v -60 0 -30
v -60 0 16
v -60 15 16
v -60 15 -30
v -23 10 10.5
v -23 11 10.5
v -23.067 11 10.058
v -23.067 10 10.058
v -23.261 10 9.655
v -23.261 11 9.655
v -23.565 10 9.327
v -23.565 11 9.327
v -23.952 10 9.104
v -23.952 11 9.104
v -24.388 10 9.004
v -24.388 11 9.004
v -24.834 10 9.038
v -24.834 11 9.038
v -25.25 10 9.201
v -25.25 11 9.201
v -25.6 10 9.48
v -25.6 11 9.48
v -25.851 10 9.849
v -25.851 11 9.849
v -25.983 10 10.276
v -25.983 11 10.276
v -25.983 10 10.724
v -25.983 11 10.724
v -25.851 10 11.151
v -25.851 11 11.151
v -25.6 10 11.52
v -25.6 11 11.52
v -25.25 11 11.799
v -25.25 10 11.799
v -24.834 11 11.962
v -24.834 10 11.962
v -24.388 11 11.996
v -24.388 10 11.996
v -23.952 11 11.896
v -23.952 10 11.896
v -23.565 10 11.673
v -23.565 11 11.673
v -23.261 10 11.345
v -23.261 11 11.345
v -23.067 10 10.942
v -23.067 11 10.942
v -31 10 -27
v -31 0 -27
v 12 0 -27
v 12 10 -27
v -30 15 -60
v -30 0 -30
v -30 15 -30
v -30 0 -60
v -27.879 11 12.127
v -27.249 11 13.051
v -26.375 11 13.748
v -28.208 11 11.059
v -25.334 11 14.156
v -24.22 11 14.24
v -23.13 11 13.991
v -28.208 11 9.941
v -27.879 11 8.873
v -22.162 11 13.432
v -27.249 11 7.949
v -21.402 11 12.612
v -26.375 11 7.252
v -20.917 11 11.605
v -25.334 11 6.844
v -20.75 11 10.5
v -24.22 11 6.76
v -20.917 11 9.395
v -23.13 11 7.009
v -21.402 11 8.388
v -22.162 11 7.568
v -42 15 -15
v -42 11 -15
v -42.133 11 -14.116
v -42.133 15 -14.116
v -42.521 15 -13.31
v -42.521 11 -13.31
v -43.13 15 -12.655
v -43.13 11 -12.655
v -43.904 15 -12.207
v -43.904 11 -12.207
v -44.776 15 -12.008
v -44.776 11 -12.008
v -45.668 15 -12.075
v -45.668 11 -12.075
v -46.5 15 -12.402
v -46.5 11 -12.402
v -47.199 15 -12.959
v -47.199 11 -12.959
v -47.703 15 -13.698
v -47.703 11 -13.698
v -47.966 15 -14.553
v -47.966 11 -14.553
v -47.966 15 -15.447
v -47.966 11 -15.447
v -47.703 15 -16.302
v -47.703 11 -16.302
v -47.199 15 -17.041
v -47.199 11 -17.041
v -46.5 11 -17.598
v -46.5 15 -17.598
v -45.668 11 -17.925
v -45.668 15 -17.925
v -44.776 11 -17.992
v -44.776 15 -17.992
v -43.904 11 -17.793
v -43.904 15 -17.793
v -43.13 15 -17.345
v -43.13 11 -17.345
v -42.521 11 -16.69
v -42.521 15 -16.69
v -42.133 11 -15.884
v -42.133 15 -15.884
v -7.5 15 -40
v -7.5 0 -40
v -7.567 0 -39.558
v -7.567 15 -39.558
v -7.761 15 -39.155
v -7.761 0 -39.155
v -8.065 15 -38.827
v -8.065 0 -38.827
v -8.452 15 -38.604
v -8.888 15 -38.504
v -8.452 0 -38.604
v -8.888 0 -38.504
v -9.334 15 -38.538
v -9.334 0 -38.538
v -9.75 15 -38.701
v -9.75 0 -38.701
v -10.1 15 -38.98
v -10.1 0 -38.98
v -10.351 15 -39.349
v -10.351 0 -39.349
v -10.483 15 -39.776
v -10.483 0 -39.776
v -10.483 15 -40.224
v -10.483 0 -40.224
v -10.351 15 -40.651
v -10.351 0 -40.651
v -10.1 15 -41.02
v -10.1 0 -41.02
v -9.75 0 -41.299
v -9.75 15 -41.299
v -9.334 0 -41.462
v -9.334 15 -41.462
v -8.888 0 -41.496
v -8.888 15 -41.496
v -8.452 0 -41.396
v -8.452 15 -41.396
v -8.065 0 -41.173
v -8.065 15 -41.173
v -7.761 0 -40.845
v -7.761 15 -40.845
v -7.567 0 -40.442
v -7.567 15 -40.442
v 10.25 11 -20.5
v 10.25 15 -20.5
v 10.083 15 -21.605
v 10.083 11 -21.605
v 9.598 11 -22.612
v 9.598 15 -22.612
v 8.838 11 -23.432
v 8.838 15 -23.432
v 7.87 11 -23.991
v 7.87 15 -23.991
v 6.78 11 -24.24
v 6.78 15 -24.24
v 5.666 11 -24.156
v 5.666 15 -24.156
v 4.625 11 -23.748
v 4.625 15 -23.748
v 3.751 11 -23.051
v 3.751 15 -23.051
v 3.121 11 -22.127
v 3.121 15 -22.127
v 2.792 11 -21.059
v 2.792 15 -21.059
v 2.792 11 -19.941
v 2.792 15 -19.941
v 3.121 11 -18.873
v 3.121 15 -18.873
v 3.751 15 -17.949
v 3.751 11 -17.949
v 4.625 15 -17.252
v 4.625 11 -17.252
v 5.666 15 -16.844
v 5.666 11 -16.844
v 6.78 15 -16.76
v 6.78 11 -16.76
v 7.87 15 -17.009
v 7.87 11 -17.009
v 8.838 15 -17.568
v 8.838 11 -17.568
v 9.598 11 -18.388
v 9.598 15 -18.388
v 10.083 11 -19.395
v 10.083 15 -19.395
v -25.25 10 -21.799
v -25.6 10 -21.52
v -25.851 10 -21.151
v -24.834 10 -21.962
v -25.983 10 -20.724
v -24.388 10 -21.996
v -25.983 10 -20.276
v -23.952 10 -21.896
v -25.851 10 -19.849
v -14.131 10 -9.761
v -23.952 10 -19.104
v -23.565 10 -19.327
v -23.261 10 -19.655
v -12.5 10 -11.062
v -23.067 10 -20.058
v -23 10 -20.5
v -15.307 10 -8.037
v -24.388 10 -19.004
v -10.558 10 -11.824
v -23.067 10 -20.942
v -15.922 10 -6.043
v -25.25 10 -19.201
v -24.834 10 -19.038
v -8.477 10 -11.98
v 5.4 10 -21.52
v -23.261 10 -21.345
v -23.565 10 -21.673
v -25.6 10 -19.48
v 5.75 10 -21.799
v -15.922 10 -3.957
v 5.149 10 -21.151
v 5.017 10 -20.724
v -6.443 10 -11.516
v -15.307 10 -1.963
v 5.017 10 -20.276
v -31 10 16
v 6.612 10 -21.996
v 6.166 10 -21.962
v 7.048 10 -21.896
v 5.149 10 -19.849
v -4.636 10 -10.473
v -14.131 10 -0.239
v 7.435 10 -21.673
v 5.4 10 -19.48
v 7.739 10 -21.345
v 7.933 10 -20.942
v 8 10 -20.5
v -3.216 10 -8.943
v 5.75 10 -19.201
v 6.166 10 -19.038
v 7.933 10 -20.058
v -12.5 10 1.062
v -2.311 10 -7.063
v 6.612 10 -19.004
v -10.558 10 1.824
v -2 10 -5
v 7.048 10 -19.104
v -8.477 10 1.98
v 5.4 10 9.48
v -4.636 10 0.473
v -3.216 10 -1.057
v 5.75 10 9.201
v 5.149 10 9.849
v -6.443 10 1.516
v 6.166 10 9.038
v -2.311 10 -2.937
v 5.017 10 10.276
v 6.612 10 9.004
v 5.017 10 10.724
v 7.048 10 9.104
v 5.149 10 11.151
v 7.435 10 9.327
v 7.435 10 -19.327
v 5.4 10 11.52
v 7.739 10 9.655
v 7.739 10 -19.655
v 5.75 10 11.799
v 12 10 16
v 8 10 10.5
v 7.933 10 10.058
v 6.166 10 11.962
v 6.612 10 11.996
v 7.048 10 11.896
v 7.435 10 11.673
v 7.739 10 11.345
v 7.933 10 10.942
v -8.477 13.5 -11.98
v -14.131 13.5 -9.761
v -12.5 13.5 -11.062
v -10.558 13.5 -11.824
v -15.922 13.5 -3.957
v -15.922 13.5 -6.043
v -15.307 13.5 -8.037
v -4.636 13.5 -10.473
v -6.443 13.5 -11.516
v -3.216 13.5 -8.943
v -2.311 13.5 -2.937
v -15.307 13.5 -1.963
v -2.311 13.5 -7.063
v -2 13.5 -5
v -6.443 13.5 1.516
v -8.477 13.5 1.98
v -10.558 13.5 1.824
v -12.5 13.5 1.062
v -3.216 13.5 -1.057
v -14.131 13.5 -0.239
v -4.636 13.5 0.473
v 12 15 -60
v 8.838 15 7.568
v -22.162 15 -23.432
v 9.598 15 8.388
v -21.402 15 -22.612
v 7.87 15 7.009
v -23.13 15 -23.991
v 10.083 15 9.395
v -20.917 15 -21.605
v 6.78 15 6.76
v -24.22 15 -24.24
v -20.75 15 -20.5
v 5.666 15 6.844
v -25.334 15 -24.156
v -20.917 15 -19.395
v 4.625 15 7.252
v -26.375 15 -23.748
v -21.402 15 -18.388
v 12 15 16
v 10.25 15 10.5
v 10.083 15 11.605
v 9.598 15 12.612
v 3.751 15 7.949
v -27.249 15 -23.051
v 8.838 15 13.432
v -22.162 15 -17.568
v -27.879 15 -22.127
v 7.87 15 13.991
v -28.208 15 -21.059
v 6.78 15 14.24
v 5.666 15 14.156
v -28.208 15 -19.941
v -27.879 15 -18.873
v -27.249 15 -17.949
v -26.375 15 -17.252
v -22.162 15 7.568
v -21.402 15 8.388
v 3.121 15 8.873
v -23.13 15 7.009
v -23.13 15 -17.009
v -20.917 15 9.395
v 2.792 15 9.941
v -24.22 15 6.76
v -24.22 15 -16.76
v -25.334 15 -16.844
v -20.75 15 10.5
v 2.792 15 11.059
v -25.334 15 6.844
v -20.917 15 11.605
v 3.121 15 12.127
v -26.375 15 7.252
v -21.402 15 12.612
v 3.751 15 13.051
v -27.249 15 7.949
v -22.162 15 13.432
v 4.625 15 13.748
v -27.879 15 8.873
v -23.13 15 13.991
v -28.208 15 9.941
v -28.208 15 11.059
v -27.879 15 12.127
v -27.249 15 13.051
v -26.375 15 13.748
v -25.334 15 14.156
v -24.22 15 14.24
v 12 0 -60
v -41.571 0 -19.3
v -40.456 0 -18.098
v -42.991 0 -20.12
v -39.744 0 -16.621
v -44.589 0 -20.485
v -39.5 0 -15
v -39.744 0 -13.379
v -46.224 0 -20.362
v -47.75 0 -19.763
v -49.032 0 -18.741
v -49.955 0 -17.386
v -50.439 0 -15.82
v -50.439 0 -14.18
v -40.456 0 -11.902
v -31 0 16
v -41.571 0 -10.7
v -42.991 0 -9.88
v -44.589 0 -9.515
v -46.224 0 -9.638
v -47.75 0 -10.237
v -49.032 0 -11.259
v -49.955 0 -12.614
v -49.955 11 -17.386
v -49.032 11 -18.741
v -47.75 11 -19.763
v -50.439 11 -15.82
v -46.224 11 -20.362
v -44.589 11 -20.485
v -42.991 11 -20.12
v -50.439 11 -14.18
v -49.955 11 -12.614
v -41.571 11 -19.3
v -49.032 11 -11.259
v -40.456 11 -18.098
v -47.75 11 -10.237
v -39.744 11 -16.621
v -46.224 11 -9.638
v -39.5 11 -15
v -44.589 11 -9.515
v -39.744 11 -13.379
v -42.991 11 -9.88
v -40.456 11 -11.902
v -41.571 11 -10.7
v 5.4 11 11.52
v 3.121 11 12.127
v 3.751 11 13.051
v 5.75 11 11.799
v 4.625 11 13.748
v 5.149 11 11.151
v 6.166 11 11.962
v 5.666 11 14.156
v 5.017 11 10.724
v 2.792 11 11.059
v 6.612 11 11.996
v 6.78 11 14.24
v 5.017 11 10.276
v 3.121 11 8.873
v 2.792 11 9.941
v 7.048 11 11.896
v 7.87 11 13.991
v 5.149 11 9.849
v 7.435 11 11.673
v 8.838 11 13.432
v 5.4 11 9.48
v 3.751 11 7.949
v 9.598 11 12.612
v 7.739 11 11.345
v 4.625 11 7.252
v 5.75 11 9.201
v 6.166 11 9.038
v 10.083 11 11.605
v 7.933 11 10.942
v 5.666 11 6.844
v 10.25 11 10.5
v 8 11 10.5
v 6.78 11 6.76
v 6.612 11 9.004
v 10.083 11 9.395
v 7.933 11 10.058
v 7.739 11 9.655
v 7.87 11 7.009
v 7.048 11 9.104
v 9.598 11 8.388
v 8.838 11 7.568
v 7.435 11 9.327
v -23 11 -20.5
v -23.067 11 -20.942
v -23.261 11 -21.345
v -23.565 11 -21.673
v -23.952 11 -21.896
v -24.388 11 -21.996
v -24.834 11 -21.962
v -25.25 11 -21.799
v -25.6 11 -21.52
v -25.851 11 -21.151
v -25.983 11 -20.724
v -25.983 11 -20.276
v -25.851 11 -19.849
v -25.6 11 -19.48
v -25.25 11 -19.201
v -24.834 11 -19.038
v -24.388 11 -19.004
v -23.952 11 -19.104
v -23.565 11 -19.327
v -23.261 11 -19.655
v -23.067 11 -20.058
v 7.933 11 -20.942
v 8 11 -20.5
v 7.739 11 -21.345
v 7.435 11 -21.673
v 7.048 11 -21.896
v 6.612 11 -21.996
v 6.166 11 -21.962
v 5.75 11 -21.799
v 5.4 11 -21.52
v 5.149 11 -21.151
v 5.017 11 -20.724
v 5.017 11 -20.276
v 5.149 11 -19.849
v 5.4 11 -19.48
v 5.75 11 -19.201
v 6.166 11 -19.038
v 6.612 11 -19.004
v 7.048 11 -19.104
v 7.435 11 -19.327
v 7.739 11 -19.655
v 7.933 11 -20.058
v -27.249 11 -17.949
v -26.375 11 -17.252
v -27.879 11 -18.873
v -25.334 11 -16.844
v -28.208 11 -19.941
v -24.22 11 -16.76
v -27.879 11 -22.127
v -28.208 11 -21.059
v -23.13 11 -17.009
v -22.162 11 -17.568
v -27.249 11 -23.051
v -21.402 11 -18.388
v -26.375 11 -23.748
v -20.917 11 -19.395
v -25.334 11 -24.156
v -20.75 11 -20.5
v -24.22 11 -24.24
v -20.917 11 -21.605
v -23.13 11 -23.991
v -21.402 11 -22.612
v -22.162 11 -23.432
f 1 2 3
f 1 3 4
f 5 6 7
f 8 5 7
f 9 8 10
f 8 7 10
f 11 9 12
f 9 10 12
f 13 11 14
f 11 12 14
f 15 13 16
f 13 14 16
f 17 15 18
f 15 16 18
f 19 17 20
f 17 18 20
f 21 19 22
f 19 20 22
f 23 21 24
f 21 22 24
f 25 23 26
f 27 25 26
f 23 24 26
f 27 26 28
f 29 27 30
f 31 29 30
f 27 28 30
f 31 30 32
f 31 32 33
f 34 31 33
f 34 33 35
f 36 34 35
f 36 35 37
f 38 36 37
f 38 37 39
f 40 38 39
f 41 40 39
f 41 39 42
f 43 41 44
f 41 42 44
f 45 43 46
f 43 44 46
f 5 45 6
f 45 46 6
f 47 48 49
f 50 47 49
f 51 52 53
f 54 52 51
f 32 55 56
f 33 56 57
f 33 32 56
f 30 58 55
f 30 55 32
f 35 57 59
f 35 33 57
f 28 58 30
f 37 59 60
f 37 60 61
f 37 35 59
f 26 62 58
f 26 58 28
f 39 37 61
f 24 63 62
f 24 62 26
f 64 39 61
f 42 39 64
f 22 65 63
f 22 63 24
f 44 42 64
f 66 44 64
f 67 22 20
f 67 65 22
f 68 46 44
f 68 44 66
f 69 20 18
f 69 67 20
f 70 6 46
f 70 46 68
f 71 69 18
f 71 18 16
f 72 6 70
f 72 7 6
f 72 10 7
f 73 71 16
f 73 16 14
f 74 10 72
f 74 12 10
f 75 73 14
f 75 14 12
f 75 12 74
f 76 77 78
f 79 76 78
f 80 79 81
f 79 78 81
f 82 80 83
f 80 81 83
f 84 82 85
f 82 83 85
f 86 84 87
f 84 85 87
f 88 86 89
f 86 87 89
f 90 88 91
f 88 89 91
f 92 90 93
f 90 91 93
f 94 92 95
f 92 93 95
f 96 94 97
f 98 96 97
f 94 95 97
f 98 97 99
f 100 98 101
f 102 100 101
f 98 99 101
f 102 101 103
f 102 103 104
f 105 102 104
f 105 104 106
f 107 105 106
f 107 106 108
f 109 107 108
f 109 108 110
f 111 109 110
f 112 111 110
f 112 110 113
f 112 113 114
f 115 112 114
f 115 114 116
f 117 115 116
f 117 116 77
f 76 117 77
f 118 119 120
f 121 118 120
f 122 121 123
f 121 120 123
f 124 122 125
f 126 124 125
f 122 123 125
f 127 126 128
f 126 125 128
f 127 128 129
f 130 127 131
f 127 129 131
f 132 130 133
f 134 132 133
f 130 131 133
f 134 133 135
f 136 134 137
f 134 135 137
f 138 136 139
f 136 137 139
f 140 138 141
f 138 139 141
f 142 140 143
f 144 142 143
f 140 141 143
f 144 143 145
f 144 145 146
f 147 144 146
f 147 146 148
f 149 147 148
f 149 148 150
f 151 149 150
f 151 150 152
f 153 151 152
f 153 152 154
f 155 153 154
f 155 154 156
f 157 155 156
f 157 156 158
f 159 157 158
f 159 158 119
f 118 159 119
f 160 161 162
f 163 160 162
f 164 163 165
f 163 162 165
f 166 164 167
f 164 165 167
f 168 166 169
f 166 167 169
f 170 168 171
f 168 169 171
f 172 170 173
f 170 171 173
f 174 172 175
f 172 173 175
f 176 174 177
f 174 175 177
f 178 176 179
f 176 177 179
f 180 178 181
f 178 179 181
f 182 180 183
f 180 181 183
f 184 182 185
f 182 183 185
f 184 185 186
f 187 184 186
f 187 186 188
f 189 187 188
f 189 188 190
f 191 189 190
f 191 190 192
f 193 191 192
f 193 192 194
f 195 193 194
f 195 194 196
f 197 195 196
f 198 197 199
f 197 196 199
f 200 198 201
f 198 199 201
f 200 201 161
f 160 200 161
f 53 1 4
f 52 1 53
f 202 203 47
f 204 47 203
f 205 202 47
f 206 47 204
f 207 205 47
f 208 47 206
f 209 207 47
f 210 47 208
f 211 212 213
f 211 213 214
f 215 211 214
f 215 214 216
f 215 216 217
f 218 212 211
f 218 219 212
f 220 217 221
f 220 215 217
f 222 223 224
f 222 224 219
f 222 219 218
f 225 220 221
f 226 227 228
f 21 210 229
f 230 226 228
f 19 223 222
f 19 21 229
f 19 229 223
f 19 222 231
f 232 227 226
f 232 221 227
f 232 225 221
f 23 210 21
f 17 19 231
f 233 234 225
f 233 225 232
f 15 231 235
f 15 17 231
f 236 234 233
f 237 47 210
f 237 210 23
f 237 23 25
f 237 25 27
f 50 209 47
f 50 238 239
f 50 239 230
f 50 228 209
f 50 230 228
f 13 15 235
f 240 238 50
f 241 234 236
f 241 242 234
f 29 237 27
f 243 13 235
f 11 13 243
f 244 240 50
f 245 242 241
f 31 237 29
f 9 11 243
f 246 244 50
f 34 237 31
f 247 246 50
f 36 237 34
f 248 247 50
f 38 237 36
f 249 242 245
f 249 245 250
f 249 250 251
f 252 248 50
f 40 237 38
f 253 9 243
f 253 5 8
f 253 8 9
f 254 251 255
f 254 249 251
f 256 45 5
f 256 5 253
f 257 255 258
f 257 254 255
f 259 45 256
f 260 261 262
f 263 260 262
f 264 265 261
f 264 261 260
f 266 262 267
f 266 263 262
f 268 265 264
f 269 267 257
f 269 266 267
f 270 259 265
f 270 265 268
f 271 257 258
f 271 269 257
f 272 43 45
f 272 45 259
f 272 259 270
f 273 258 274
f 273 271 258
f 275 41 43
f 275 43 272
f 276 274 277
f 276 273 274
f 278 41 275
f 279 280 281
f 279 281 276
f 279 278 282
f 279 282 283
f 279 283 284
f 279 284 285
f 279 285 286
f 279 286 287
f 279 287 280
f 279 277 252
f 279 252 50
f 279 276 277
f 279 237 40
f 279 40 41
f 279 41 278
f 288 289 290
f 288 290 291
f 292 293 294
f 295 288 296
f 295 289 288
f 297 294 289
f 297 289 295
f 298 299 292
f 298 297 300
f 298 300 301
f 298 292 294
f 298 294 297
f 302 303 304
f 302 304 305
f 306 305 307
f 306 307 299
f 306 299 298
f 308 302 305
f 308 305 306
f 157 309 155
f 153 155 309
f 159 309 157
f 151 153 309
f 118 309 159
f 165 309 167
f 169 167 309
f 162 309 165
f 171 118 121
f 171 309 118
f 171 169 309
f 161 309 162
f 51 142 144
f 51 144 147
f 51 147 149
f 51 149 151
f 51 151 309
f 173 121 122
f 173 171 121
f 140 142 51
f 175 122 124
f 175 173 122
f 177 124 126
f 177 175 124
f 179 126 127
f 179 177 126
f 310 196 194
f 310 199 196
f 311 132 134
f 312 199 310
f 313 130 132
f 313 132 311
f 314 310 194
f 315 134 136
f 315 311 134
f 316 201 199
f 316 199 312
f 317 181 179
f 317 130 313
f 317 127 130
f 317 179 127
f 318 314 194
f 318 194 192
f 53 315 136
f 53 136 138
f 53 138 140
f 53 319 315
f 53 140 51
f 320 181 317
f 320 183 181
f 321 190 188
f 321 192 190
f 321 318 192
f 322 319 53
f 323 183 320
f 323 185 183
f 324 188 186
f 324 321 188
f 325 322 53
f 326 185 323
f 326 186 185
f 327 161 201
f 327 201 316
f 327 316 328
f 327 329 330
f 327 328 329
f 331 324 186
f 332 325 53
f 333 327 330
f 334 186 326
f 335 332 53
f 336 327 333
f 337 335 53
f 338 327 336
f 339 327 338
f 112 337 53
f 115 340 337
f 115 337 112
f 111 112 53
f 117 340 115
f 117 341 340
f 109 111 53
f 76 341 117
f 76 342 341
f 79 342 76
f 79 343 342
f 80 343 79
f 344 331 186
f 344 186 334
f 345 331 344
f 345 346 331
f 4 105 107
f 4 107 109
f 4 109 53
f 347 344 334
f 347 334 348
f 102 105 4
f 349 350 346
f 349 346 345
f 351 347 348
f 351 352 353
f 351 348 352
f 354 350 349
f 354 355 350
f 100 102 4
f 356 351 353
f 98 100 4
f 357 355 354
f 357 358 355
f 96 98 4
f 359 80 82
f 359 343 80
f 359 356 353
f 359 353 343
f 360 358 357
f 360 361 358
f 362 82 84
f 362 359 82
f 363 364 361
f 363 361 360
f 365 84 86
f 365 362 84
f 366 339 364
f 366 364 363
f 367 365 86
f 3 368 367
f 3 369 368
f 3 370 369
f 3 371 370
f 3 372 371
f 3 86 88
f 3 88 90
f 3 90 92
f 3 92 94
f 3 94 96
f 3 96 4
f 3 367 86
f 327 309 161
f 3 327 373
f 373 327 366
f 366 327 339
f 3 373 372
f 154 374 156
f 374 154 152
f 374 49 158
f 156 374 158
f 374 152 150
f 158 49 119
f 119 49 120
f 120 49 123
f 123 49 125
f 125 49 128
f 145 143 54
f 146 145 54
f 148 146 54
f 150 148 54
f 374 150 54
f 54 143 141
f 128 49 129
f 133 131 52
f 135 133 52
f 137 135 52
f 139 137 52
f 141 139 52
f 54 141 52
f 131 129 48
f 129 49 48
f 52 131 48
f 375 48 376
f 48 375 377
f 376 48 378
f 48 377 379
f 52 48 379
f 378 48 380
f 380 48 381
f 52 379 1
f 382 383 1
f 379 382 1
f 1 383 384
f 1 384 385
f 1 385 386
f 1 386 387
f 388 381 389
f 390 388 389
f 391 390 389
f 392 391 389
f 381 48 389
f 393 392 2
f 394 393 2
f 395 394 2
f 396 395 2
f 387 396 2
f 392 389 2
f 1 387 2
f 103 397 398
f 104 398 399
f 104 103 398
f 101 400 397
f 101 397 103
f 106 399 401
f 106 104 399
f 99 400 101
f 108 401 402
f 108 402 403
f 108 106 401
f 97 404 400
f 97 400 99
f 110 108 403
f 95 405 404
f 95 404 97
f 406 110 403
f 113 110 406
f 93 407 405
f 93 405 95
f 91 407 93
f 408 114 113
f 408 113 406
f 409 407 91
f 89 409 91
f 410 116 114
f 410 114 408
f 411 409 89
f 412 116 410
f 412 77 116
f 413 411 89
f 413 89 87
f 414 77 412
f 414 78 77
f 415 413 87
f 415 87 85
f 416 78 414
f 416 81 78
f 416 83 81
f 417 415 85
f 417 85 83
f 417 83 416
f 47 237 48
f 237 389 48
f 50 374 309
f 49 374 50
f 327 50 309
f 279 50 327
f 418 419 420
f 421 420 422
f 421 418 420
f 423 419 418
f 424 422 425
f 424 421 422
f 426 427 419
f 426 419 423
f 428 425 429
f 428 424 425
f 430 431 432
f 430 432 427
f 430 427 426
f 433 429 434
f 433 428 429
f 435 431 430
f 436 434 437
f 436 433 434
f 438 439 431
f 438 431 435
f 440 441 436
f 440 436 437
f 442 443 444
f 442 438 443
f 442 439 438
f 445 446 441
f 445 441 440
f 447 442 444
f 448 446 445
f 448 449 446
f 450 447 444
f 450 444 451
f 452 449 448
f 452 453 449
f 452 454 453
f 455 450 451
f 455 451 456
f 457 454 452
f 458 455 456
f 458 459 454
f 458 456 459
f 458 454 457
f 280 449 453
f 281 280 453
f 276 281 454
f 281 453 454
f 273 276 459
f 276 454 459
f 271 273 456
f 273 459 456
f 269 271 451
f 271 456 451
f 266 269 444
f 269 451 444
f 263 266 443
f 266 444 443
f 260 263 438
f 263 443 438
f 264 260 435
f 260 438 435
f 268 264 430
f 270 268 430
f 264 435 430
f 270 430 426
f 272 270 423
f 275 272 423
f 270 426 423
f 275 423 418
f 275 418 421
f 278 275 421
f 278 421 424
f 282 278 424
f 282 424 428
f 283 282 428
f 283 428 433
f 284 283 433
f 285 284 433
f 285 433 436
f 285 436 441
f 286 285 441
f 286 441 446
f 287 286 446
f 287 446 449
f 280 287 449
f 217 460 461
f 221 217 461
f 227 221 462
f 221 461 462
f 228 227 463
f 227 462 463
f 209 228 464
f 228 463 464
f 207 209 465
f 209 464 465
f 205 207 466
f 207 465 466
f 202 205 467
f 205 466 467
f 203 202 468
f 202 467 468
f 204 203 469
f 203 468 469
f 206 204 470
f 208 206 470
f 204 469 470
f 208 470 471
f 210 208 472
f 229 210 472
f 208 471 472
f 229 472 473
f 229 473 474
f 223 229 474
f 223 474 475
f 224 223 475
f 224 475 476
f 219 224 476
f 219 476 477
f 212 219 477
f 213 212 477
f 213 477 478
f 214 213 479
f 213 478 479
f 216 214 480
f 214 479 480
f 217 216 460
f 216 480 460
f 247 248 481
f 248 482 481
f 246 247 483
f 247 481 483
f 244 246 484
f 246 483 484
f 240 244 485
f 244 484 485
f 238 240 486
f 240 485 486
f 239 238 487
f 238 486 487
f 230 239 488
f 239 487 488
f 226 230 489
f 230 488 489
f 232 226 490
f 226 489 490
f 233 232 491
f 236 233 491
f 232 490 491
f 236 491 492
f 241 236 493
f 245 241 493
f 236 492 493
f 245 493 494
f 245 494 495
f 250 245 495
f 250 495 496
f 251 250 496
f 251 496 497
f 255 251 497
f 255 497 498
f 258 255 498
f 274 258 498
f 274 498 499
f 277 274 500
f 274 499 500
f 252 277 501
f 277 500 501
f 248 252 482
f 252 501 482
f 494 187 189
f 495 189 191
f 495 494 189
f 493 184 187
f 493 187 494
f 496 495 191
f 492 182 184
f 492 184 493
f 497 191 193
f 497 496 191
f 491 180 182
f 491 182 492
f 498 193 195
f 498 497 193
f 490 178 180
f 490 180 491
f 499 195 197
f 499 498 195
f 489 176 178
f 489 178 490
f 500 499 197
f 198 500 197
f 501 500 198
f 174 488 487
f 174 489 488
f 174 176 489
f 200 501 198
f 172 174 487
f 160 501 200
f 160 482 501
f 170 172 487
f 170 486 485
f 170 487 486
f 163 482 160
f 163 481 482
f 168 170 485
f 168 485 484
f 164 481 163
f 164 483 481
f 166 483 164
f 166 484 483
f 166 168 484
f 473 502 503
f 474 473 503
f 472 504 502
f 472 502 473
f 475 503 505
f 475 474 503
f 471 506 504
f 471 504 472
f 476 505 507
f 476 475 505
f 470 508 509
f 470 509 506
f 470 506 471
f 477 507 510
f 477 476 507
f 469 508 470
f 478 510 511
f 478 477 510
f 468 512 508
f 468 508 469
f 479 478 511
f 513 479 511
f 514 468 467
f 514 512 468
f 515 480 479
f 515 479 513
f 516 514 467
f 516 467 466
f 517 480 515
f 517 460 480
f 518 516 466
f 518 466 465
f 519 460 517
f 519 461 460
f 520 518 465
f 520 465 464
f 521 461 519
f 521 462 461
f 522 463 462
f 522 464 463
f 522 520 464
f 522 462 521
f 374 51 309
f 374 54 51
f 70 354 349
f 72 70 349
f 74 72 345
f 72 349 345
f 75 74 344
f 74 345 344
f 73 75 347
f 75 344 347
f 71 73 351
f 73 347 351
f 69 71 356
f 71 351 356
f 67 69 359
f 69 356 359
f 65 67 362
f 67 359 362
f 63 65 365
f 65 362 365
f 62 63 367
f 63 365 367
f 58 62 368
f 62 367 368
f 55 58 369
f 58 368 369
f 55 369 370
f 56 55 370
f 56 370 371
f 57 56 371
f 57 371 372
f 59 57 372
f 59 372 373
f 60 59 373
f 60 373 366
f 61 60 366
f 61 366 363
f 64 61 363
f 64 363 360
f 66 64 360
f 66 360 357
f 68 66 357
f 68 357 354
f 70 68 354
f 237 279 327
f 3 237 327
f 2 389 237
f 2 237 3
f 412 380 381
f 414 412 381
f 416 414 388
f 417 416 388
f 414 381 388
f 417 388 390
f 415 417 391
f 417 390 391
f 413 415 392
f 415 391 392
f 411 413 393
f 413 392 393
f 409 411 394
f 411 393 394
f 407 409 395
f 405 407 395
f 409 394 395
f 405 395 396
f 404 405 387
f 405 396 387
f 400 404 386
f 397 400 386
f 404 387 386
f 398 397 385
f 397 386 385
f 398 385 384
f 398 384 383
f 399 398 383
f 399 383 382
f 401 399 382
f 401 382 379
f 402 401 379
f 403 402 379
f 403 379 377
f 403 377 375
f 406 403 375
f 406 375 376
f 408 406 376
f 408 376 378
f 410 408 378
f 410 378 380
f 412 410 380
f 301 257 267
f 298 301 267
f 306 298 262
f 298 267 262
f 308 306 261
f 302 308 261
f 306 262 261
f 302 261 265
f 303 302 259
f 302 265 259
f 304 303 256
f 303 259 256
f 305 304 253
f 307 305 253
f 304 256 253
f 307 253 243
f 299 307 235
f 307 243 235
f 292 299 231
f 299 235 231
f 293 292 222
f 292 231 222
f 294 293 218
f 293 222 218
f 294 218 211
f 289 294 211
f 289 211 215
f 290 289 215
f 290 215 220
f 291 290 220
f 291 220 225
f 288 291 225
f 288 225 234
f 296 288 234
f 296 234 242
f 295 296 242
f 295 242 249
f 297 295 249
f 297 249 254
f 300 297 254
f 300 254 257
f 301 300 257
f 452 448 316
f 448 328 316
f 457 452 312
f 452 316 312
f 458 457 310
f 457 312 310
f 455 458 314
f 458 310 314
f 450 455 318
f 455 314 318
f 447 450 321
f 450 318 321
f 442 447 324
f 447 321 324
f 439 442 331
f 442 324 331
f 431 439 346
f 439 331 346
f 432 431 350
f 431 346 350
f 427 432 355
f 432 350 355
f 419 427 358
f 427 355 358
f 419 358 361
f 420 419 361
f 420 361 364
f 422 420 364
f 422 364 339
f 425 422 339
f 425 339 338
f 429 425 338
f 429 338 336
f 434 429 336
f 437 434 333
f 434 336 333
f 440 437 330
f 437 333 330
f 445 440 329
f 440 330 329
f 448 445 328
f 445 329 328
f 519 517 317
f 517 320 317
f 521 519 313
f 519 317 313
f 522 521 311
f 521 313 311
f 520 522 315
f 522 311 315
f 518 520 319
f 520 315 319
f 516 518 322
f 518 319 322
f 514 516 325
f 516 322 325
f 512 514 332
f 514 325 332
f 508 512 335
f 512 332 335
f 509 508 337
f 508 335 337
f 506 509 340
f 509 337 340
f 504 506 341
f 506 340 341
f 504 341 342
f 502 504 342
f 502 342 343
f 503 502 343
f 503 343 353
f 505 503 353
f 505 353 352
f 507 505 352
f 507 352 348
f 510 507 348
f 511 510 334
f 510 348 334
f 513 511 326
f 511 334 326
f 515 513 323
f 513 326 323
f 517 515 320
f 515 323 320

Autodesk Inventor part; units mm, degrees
ref_plane "YZ Plane" through (0, 0, 0) normal (1, 0, 0) x (0, 1, 0)
ref_plane "XZ Plane" through (0, 0, 0) normal (0, 1, 0) x (-1, 0, 0)
ref_plane "XY Plane" through (0, 0, 0) normal (0, 0, 1) x (1, 0, 0)
sketch "Sketch1" plane through (0, 0, 0) normal (0, 1, 0) x (-1, 0, 0)
  line L0 (-12, 16) -> (60, 16)
  line L1 (60, 16) -> (60, -30)
  line L2 (60, -30) -> (30, -30)
  line L3 (30, -30) -> (30, -60)
  line L4 (30, -60) -> (-12, -60)
  line L5 (-12, -60) -> (-12, 16)
  dimension "d0" = 72
  dimension "d1" = 46
  dimension "d2" = 30
  dimension "d3" = 30
  dimension "d4" = 42
extrude "Extrusion1" add sketch "Sketch1" along normal blind 15
sketch "Sketch13" plane through (0, 15, 0) normal (0, 1, 0) x (1, 0, 0)
  circle A0 centre (6.5, -10.5) radius 3.75
  circle A1 centre (-24.5, -10.5) radius 3.75
  circle A2 centre (6.5, 20.5) radius 3.75
  circle A3 centre (-24.5, 20.5) radius 3.75
  line L0 (-60, -16) -> (12, -16) projected
  point P0 (0, 0)
  dimension "d57" = 7.5
  dimension "d58" = 7.5
  dimension "d59" = 7.5
  dimension "d60" = 7.5
  dimension "d68" = 5.5
  dimension "d69" = 31
extrude "Extrusion7" cut sketch "Sketch13" against normal blind 4
sketch "Sketch14" plane through (6.5, 11, 10.5) normal (0, 1, 0) x (1, 0, 0)
  circle A0 centre (0, 0) radius 1.5
  circle A1 centre (-31, 0) radius 1.5
  circle A2 centre (0, 31) radius 3.75 projected
  circle A3 centre (0, 31) radius 1.5
  circle A4 centre (-31, 31) radius 1.5
  point P0 (-6.5, 10.5)
  dimension "d63" = 3
  dimension "d64" = 3
  dimension "d65" = 3
extrude "Extrusion8" cut sketch "Sketch14" against normal up to next contours A0 | A1 | A3 | A4
sketch "Sketch15" plane through (0, 0, 0) normal (0, -1, 0) x (1, 0, 0)
  circle A0 centre (-45, -15) radius 3
  circle A1 centre (-9, -40) radius 1.5
  line L0 (-30, -60) -> (12, -60) projected
  point P0 (0, 0)
  dimension "d72" = 6
  dimension "d73" = 3
  dimension "d89" = 20
extrude "Extrusion10" cut sketch "Sketch15" against normal up to next
sketch "Sketch16" plane through (0, 0, 0) normal (0, -1, 0) x (1, 0, 0)
  circle A0 centre (-9, -5) radius 7
  point P0 (0, 0)
  dimension "d79" = 14
extrude "Extrusion11" cut sketch "Sketch16" against normal blind 4
sketch "Sketch17" plane through (0, 0, 0) normal (0, -1, 0) x (1, 0, 0)
  line L0 (12, 16) -> (-31, 16)
  line L1 (-31, 16) -> (-31, -27)
  line L2 (-31, -27) -> (12, -27)
  line L3 (12, -27) -> (12, 16)
  point P0 (0, 0)
  dimension "d82" = 43
  dimension "d83" = 43
extrude "Extrusion12" cut sketch "Sketch17" against normal blind 10
sketch "Sketch18" plane through (0, 10, 0) normal (0, -1, 0) x (1, 0, 0)
  circle A0 centre (-9, -5) radius 7
  point P0 (0, 0)
  dimension "d86" = 14
extrude "Extrusion13" cut sketch "Sketch18" against normal blind 3.5
sketch "Sketch19" plane through (0, 0, 0) normal (0, -1, 0) x (1, 0, 0)
  circle A0 centre (-45, -15) radius 5.5
  point P0 (0, 0)
  dimension "d90" = 11
extrude "Extrusion14" cut sketch "Sketch19" against normal blind 11
sketch "Sketch3" plane through (0, 15, 0) normal (0, 1, 0) x (1, 0, 0)
  point P0 (-45, 15)
properties part number "wooden1" material "Aluminum 6061"
